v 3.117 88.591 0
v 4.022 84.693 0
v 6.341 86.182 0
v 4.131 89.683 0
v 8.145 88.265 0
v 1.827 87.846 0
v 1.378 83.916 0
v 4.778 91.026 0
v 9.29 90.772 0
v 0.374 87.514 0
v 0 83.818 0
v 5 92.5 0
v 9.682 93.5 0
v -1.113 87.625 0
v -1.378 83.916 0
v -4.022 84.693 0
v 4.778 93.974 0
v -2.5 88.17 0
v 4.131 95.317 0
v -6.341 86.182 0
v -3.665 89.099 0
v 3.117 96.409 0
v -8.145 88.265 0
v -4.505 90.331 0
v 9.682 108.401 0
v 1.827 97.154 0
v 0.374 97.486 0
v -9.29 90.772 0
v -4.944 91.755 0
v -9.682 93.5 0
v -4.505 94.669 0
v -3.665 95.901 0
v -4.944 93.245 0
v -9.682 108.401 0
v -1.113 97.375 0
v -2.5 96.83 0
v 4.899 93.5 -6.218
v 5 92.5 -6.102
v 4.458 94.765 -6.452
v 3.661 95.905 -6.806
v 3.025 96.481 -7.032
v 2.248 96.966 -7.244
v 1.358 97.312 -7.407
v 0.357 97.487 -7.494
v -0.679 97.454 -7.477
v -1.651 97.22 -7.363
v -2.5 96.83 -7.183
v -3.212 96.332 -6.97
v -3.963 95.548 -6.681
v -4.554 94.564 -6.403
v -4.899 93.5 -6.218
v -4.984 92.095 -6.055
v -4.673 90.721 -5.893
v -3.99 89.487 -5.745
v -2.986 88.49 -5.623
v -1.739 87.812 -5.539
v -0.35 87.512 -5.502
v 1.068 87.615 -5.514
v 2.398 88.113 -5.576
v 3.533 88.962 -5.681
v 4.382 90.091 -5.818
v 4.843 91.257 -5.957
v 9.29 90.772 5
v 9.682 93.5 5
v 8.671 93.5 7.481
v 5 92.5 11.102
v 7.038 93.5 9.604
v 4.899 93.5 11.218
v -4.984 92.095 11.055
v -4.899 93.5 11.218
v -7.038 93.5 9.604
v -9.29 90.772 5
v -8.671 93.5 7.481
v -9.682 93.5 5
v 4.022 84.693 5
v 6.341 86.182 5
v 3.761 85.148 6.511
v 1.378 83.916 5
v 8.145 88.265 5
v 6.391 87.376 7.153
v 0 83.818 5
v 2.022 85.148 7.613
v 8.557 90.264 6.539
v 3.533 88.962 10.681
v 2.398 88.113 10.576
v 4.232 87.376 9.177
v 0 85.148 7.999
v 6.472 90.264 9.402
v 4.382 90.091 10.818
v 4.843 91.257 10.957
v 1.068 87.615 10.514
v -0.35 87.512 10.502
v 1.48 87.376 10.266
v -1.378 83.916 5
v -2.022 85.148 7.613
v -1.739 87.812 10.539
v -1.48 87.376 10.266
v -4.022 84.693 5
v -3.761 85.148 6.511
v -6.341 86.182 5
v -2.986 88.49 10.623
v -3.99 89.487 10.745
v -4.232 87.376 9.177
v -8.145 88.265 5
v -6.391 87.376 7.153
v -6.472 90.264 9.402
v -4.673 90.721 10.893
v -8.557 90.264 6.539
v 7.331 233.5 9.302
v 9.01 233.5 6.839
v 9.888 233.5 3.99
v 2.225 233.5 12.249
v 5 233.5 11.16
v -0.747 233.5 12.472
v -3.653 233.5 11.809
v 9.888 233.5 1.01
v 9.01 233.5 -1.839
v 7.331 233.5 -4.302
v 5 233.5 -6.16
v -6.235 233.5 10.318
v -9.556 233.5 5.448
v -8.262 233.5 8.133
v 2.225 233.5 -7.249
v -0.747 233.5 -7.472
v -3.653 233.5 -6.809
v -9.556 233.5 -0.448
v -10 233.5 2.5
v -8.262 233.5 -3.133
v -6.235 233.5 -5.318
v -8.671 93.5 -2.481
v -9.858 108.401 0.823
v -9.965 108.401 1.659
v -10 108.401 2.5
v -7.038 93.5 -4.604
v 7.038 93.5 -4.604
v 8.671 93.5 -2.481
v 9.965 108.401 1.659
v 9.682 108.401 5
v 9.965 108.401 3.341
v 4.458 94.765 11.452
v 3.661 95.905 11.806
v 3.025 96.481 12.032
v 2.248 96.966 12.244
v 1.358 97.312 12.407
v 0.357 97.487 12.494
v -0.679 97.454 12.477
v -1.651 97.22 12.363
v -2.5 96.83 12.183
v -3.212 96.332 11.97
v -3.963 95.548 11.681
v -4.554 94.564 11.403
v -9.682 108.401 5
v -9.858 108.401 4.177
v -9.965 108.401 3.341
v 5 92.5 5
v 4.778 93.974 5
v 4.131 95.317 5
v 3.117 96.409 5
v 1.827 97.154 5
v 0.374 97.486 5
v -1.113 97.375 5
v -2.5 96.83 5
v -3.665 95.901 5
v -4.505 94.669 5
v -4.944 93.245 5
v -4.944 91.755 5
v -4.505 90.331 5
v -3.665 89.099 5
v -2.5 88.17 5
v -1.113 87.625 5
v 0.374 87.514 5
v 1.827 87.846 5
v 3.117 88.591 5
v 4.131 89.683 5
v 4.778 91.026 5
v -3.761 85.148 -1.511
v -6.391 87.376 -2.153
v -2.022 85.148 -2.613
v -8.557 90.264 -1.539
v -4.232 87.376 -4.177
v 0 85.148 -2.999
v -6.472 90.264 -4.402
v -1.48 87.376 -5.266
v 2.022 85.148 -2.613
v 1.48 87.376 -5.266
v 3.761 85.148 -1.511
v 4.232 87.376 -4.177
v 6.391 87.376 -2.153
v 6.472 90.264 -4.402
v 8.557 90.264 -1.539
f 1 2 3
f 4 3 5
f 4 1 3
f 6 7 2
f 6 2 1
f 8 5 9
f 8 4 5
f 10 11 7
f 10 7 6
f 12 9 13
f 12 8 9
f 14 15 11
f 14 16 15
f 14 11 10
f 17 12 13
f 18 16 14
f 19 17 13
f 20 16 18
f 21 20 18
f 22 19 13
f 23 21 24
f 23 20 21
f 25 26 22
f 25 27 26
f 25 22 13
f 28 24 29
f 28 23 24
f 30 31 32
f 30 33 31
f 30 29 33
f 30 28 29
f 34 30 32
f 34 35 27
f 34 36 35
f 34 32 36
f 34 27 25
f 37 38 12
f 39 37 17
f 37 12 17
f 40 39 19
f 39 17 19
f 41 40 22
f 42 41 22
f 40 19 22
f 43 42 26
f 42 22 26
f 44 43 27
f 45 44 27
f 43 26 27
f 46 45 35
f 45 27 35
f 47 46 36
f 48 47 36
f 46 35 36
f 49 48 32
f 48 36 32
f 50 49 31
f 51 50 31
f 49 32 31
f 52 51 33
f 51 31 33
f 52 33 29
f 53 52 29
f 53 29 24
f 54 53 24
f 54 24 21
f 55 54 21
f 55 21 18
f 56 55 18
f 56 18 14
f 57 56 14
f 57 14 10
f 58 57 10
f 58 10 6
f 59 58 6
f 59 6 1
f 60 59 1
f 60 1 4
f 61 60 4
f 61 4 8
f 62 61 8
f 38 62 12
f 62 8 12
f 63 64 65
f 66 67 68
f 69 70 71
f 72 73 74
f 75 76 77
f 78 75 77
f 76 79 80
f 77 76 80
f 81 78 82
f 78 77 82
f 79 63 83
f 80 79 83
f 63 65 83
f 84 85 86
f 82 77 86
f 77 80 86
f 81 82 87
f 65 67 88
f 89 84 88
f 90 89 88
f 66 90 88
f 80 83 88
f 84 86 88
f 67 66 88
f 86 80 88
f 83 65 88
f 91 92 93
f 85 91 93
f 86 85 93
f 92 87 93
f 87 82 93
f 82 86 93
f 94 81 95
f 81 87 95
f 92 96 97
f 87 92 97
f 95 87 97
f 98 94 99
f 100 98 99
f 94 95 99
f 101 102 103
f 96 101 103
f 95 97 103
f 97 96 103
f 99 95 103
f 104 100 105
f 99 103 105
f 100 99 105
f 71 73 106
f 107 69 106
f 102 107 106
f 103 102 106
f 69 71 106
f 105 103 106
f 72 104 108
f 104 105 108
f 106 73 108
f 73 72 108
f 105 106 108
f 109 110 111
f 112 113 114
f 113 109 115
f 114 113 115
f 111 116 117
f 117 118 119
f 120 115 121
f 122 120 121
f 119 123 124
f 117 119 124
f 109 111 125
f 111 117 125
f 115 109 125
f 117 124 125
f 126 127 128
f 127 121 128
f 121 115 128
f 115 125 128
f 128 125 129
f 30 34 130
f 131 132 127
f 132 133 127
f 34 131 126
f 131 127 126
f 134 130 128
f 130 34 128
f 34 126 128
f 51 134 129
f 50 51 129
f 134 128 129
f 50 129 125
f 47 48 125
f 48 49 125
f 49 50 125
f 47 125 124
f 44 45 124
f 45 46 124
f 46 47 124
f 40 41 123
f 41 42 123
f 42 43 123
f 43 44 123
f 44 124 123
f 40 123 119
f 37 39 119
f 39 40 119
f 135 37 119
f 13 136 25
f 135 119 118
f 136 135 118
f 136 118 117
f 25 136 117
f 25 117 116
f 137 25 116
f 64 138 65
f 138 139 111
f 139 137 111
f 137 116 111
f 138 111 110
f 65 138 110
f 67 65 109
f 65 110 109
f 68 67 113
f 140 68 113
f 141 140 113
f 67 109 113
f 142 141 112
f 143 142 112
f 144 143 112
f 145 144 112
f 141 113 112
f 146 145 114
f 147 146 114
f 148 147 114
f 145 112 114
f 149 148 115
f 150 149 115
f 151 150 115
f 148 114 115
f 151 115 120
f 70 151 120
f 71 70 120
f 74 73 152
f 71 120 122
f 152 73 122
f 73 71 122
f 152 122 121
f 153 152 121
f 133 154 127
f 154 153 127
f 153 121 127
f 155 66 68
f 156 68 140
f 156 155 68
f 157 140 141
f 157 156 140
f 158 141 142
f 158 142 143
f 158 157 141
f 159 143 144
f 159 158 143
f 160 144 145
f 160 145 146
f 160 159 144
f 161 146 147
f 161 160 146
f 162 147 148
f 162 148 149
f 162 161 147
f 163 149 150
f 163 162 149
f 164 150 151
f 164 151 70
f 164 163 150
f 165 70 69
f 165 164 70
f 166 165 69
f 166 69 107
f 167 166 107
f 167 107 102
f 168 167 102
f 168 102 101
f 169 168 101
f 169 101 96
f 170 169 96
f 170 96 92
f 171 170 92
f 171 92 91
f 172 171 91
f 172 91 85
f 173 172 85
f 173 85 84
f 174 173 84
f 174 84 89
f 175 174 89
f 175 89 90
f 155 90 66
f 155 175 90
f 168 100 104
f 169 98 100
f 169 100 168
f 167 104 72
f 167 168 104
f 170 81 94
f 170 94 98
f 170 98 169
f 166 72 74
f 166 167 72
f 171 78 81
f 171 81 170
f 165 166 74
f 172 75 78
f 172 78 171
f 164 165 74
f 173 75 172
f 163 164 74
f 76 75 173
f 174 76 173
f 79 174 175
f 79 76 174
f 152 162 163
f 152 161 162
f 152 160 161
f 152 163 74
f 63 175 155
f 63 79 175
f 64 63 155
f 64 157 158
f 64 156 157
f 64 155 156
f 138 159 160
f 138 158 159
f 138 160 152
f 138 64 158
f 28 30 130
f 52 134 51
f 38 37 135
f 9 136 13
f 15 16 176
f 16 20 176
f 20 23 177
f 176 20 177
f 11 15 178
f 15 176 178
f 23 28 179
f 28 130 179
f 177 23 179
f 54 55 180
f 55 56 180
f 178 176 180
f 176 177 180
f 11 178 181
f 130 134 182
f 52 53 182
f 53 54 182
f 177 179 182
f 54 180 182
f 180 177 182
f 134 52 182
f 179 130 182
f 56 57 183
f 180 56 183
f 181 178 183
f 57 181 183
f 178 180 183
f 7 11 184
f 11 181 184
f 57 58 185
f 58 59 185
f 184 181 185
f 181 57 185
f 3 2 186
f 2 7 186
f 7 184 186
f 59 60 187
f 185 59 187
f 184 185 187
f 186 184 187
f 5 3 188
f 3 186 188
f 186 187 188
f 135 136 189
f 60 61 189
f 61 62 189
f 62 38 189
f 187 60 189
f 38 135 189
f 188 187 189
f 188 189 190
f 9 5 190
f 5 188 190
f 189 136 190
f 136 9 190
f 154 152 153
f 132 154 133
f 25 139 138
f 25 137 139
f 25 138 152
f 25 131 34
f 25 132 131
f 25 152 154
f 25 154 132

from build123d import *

# Parameters (mm, degrees)
SKETCH2_W               = 5
SKETCH2_H               = 33.382597824
CUT_EXTRUDE1_DEPTH      = 11
CUT_EXTRUDE1_DEPTH_BACK = 11
SKETCH3_R               = 5
CUT_EXTRUDE2_DEPTH      = 13.5
CUT_EXTRUDE2_DEPTH_BACK = 8.5


with BuildPart() as part:
    # Sketch1 → Revolve1 (revolve)
    with BuildSketch(Plane(origin=(0, 0, 2.5), x_dir=(-1, 0, 0), z_dir=(0, 0, -1))):
        with BuildLine():
            Line((0, 233.5), (0, 83.5))
            ThreePointArc((0, 83.5), (7.071067812, 86.428932188), (10, 93.5))
            Line((10, 93.5), (10, 233.5))
            Line((10, 233.5), (0, 233.5))
        make_face()
    revolve(axis=Axis((0, 233.5, 2.5), (0, -1, 0)))

    # Sketch2 → Cut-Extrude1 (cut, two sides)
    with BuildSketch(Plane(origin=(0, 0, 0), x_dir=(0, 0, -1), z_dir=(1, 0, 0))) as cut_extrude1_sk:
        with Locations((-2.5, 91.70929716)):
            Rectangle(SKETCH2_W, SKETCH2_H)
    extrude(amount=CUT_EXTRUDE1_DEPTH, mode=Mode.SUBTRACT)
    extrude(cut_extrude1_sk.sketch, amount=-CUT_EXTRUDE1_DEPTH_BACK, mode=Mode.SUBTRACT)

    # Sketch3 → Cut-Extrude2 (cut, two sides)
    with BuildSketch(Plane.XY) as cut_extrude2_sk:
        with Locations((0, 92.5)):
            Circle(SKETCH3_R)
    extrude(amount=CUT_EXTRUDE2_DEPTH, mode=Mode.SUBTRACT)
    extrude(cut_extrude2_sk.sketch, amount=-CUT_EXTRUDE2_DEPTH_BACK, mode=Mode.SUBTRACT)


solid = part.part
